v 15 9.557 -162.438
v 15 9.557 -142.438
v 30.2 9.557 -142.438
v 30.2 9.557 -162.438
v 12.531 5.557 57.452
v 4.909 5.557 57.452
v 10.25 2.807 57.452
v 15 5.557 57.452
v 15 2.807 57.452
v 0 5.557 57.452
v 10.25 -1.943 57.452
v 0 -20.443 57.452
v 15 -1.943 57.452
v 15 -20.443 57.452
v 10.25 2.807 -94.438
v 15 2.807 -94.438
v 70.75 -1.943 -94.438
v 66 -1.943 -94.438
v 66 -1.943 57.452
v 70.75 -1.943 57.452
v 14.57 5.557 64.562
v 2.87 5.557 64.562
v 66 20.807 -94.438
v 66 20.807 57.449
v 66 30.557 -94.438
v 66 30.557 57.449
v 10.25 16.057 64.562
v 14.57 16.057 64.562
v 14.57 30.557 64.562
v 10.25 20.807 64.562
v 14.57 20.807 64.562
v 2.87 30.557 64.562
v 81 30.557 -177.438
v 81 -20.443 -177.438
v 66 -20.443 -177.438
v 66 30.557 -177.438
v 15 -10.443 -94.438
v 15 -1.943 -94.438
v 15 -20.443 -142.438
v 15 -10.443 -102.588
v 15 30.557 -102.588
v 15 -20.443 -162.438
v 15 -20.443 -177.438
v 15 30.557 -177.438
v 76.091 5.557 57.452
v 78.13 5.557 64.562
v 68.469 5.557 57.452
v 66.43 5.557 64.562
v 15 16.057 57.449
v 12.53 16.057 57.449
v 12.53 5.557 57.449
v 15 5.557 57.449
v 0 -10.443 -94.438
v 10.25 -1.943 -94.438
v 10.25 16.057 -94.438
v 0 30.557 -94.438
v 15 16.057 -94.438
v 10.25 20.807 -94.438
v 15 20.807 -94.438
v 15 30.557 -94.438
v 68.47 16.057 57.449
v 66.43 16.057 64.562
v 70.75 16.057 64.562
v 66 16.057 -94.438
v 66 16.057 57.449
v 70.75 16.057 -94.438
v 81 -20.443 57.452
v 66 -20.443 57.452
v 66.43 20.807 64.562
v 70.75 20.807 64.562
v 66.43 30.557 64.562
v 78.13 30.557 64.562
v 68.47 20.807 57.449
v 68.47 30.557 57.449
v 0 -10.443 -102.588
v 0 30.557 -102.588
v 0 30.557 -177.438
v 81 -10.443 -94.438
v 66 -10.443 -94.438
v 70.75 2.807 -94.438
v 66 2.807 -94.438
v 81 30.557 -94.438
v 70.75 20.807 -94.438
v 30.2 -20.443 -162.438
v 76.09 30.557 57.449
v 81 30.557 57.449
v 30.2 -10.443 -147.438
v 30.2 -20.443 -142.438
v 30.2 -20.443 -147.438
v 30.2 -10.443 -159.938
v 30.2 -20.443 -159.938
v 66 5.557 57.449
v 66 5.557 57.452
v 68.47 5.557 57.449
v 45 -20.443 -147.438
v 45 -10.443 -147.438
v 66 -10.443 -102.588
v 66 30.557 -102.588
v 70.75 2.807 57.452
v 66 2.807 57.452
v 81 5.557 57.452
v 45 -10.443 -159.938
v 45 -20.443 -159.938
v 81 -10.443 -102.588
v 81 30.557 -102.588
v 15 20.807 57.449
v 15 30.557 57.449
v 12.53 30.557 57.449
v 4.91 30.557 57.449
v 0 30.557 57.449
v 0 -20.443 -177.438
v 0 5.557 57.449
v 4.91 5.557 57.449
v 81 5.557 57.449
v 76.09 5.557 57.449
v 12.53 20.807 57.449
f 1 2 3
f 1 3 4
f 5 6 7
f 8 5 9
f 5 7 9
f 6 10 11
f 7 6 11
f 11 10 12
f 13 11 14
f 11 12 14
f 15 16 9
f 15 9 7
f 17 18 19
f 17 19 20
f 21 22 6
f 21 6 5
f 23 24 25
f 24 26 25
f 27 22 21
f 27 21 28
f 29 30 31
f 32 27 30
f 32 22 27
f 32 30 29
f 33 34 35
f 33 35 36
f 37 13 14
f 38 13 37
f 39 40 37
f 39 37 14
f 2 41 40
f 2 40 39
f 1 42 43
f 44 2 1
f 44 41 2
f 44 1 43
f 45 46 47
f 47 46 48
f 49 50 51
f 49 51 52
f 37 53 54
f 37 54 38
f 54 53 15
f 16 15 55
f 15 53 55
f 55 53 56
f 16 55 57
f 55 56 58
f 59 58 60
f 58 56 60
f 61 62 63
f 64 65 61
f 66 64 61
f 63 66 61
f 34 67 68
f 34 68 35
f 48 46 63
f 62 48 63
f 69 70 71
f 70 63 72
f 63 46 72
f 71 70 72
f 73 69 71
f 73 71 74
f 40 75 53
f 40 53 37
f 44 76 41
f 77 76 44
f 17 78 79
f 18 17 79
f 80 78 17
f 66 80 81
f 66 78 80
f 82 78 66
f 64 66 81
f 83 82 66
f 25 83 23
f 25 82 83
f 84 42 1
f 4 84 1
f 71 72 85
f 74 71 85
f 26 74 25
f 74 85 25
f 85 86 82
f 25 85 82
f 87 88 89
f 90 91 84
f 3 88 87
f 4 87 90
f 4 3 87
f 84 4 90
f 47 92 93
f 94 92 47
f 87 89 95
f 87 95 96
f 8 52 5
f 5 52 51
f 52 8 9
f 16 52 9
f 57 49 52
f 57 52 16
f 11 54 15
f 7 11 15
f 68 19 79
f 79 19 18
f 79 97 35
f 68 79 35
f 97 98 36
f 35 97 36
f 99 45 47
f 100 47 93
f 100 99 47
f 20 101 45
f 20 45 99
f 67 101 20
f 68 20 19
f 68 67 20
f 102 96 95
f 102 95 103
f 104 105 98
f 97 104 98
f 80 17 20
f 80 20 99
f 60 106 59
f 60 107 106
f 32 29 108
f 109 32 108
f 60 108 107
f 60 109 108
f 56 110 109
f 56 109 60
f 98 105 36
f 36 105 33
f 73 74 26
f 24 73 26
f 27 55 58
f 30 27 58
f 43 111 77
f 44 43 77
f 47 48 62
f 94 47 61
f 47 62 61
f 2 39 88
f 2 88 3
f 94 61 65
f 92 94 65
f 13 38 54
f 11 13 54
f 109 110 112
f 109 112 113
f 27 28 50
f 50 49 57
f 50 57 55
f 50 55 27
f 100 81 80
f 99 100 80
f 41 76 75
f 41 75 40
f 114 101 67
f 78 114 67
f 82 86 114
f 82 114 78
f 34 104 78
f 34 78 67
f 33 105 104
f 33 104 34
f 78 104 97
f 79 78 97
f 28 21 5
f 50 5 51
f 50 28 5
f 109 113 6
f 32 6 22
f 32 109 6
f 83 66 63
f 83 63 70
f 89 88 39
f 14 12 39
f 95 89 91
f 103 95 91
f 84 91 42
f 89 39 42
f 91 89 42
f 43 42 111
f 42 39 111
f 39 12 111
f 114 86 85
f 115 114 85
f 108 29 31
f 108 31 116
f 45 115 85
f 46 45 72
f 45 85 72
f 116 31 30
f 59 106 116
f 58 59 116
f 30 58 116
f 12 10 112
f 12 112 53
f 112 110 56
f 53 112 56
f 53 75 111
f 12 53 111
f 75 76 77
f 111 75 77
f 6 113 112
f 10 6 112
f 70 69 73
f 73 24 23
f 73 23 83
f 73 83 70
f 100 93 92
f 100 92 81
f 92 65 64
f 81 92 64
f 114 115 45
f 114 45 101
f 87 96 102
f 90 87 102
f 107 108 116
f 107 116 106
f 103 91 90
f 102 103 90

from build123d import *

# Parameters (mm, degrees)
SKETCH1_W           = 242
SKETCH1_H           = 51
BOSS_EXTRUDE1_DEPTH = 15
CUT_EXTRUDE8_DEPTH  = 25
SKETCH13_W          = 15
SKETCH13_H          = 7.11
CUT_EXTRUDE9_DEPTH  = 26
SKETCH17_W          = 15
SKETCH17_H          = 8.15
CUT_EXTRUDE10_DEPTH = 41
SKETCH7_W           = 4.75
SKETCH7_H           = 4.75
CUT_EXTRUDE5_DEPTH  = 165
SKETCH25_W          = 12.5
SKETCH25_H          = 10
BOSS_EXTRUDE3_DEPTH = 30
SKETCH26_W          = 20
SKETCH26_H          = 30
BOSS_EXTRUDE4_DEPTH = 15.2


with BuildPart() as part:
    # Sketch1 → Boss-Extrude1 (new body)
    with BuildSketch(Plane(origin=(0, 0, 0), x_dir=(0, 0, -1), z_dir=(1, 0, 0))):
        with Locations((56.437921078, 5.057266603)):
            Rectangle(SKETCH1_W, SKETCH1_H)
    extrude(amount=BOSS_EXTRUDE1_DEPTH)

    # Sketch12 → Cut-Extrude8 (cut)
    with BuildSketch(Plane(origin=(0, 30.557266603, 0), x_dir=(1, 0, 0), z_dir=(0, 1, 0))):
        Polygon((0, -57.448742372), (4.909716433, -57.448742372), (2.87, -64.562078922), (0, -64.562078922), align=None)
        Polygon((15, -57.448742372), (15, -64.562078922), (14.57, -64.562078922), (12.530283567, -57.448742372), align=None)
    extrude(amount=-CUT_EXTRUDE8_DEPTH, mode=Mode.SUBTRACT)

    # Sketch13 → Cut-Extrude9 (cut)
    with BuildSketch(Plane.XZ.offset(20.442733397)):
        with Locations((7.5, 61.007078922)):
            Rectangle(SKETCH13_W, SKETCH13_H)
    extrude(amount=-CUT_EXTRUDE9_DEPTH, mode=Mode.SUBTRACT)

    # Sketch17 → Cut-Extrude10 (cut)
    with BuildSketch(Plane(origin=(0, 30.557266603, 0), x_dir=(1, 0, 0), z_dir=(0, 1, 0))):
        with Locations((7.5, 98.512921078)):
            Rectangle(SKETCH17_W, SKETCH17_H)
    extrude(amount=-CUT_EXTRUDE10_DEPTH, mode=Mode.SUBTRACT)

    # Sketch7 → Cut-Extrude5 (cut)
    with BuildSketch(Plane(origin=(0, 0, -94.437921078), x_dir=(-1, 0, 0), z_dir=(0, 0, -1))):
        with Locations((-12.625, 0.432266603)):
            Rectangle(SKETCH7_W, SKETCH7_H)
        with Locations((-12.625, 18.432266603)):
            Rectangle(SKETCH7_W, SKETCH7_H)
    extrude(amount=-CUT_EXTRUDE5_DEPTH, mode=Mode.SUBTRACT)


with BuildPart() as body_2:
    # Mirror4: mirrored copy
    add(part.part.mirror(Plane(origin=(40.5, 0, 0), x_dir=(0, 0, 1), z_dir=(1, 0, 0))))


with BuildPart() as part_1:
    add(part.part)

    # Sketch25 → Boss-Extrude3 (add)
    with BuildSketch(Plane(origin=(15, 0, 0), x_dir=(0, 0, -1), z_dir=(1, 0, 0))):
        with Locations((153.687921078, -15.442733397)):
            Rectangle(SKETCH25_W, SKETCH25_H)
    extrude(amount=BOSS_EXTRUDE3_DEPTH)

    # Sketch26 → Boss-Extrude4 (add)
    with BuildSketch(Plane(origin=(15, 0, 0), x_dir=(0, 0, -1), z_dir=(1, 0, 0))):
        with Locations((152.437921078, -5.442733397)):
            Rectangle(SKETCH26_W, SKETCH26_H)
    extrude(amount=BOSS_EXTRUDE4_DEPTH)


solid = Compound([body_2.part, part_1.part])
